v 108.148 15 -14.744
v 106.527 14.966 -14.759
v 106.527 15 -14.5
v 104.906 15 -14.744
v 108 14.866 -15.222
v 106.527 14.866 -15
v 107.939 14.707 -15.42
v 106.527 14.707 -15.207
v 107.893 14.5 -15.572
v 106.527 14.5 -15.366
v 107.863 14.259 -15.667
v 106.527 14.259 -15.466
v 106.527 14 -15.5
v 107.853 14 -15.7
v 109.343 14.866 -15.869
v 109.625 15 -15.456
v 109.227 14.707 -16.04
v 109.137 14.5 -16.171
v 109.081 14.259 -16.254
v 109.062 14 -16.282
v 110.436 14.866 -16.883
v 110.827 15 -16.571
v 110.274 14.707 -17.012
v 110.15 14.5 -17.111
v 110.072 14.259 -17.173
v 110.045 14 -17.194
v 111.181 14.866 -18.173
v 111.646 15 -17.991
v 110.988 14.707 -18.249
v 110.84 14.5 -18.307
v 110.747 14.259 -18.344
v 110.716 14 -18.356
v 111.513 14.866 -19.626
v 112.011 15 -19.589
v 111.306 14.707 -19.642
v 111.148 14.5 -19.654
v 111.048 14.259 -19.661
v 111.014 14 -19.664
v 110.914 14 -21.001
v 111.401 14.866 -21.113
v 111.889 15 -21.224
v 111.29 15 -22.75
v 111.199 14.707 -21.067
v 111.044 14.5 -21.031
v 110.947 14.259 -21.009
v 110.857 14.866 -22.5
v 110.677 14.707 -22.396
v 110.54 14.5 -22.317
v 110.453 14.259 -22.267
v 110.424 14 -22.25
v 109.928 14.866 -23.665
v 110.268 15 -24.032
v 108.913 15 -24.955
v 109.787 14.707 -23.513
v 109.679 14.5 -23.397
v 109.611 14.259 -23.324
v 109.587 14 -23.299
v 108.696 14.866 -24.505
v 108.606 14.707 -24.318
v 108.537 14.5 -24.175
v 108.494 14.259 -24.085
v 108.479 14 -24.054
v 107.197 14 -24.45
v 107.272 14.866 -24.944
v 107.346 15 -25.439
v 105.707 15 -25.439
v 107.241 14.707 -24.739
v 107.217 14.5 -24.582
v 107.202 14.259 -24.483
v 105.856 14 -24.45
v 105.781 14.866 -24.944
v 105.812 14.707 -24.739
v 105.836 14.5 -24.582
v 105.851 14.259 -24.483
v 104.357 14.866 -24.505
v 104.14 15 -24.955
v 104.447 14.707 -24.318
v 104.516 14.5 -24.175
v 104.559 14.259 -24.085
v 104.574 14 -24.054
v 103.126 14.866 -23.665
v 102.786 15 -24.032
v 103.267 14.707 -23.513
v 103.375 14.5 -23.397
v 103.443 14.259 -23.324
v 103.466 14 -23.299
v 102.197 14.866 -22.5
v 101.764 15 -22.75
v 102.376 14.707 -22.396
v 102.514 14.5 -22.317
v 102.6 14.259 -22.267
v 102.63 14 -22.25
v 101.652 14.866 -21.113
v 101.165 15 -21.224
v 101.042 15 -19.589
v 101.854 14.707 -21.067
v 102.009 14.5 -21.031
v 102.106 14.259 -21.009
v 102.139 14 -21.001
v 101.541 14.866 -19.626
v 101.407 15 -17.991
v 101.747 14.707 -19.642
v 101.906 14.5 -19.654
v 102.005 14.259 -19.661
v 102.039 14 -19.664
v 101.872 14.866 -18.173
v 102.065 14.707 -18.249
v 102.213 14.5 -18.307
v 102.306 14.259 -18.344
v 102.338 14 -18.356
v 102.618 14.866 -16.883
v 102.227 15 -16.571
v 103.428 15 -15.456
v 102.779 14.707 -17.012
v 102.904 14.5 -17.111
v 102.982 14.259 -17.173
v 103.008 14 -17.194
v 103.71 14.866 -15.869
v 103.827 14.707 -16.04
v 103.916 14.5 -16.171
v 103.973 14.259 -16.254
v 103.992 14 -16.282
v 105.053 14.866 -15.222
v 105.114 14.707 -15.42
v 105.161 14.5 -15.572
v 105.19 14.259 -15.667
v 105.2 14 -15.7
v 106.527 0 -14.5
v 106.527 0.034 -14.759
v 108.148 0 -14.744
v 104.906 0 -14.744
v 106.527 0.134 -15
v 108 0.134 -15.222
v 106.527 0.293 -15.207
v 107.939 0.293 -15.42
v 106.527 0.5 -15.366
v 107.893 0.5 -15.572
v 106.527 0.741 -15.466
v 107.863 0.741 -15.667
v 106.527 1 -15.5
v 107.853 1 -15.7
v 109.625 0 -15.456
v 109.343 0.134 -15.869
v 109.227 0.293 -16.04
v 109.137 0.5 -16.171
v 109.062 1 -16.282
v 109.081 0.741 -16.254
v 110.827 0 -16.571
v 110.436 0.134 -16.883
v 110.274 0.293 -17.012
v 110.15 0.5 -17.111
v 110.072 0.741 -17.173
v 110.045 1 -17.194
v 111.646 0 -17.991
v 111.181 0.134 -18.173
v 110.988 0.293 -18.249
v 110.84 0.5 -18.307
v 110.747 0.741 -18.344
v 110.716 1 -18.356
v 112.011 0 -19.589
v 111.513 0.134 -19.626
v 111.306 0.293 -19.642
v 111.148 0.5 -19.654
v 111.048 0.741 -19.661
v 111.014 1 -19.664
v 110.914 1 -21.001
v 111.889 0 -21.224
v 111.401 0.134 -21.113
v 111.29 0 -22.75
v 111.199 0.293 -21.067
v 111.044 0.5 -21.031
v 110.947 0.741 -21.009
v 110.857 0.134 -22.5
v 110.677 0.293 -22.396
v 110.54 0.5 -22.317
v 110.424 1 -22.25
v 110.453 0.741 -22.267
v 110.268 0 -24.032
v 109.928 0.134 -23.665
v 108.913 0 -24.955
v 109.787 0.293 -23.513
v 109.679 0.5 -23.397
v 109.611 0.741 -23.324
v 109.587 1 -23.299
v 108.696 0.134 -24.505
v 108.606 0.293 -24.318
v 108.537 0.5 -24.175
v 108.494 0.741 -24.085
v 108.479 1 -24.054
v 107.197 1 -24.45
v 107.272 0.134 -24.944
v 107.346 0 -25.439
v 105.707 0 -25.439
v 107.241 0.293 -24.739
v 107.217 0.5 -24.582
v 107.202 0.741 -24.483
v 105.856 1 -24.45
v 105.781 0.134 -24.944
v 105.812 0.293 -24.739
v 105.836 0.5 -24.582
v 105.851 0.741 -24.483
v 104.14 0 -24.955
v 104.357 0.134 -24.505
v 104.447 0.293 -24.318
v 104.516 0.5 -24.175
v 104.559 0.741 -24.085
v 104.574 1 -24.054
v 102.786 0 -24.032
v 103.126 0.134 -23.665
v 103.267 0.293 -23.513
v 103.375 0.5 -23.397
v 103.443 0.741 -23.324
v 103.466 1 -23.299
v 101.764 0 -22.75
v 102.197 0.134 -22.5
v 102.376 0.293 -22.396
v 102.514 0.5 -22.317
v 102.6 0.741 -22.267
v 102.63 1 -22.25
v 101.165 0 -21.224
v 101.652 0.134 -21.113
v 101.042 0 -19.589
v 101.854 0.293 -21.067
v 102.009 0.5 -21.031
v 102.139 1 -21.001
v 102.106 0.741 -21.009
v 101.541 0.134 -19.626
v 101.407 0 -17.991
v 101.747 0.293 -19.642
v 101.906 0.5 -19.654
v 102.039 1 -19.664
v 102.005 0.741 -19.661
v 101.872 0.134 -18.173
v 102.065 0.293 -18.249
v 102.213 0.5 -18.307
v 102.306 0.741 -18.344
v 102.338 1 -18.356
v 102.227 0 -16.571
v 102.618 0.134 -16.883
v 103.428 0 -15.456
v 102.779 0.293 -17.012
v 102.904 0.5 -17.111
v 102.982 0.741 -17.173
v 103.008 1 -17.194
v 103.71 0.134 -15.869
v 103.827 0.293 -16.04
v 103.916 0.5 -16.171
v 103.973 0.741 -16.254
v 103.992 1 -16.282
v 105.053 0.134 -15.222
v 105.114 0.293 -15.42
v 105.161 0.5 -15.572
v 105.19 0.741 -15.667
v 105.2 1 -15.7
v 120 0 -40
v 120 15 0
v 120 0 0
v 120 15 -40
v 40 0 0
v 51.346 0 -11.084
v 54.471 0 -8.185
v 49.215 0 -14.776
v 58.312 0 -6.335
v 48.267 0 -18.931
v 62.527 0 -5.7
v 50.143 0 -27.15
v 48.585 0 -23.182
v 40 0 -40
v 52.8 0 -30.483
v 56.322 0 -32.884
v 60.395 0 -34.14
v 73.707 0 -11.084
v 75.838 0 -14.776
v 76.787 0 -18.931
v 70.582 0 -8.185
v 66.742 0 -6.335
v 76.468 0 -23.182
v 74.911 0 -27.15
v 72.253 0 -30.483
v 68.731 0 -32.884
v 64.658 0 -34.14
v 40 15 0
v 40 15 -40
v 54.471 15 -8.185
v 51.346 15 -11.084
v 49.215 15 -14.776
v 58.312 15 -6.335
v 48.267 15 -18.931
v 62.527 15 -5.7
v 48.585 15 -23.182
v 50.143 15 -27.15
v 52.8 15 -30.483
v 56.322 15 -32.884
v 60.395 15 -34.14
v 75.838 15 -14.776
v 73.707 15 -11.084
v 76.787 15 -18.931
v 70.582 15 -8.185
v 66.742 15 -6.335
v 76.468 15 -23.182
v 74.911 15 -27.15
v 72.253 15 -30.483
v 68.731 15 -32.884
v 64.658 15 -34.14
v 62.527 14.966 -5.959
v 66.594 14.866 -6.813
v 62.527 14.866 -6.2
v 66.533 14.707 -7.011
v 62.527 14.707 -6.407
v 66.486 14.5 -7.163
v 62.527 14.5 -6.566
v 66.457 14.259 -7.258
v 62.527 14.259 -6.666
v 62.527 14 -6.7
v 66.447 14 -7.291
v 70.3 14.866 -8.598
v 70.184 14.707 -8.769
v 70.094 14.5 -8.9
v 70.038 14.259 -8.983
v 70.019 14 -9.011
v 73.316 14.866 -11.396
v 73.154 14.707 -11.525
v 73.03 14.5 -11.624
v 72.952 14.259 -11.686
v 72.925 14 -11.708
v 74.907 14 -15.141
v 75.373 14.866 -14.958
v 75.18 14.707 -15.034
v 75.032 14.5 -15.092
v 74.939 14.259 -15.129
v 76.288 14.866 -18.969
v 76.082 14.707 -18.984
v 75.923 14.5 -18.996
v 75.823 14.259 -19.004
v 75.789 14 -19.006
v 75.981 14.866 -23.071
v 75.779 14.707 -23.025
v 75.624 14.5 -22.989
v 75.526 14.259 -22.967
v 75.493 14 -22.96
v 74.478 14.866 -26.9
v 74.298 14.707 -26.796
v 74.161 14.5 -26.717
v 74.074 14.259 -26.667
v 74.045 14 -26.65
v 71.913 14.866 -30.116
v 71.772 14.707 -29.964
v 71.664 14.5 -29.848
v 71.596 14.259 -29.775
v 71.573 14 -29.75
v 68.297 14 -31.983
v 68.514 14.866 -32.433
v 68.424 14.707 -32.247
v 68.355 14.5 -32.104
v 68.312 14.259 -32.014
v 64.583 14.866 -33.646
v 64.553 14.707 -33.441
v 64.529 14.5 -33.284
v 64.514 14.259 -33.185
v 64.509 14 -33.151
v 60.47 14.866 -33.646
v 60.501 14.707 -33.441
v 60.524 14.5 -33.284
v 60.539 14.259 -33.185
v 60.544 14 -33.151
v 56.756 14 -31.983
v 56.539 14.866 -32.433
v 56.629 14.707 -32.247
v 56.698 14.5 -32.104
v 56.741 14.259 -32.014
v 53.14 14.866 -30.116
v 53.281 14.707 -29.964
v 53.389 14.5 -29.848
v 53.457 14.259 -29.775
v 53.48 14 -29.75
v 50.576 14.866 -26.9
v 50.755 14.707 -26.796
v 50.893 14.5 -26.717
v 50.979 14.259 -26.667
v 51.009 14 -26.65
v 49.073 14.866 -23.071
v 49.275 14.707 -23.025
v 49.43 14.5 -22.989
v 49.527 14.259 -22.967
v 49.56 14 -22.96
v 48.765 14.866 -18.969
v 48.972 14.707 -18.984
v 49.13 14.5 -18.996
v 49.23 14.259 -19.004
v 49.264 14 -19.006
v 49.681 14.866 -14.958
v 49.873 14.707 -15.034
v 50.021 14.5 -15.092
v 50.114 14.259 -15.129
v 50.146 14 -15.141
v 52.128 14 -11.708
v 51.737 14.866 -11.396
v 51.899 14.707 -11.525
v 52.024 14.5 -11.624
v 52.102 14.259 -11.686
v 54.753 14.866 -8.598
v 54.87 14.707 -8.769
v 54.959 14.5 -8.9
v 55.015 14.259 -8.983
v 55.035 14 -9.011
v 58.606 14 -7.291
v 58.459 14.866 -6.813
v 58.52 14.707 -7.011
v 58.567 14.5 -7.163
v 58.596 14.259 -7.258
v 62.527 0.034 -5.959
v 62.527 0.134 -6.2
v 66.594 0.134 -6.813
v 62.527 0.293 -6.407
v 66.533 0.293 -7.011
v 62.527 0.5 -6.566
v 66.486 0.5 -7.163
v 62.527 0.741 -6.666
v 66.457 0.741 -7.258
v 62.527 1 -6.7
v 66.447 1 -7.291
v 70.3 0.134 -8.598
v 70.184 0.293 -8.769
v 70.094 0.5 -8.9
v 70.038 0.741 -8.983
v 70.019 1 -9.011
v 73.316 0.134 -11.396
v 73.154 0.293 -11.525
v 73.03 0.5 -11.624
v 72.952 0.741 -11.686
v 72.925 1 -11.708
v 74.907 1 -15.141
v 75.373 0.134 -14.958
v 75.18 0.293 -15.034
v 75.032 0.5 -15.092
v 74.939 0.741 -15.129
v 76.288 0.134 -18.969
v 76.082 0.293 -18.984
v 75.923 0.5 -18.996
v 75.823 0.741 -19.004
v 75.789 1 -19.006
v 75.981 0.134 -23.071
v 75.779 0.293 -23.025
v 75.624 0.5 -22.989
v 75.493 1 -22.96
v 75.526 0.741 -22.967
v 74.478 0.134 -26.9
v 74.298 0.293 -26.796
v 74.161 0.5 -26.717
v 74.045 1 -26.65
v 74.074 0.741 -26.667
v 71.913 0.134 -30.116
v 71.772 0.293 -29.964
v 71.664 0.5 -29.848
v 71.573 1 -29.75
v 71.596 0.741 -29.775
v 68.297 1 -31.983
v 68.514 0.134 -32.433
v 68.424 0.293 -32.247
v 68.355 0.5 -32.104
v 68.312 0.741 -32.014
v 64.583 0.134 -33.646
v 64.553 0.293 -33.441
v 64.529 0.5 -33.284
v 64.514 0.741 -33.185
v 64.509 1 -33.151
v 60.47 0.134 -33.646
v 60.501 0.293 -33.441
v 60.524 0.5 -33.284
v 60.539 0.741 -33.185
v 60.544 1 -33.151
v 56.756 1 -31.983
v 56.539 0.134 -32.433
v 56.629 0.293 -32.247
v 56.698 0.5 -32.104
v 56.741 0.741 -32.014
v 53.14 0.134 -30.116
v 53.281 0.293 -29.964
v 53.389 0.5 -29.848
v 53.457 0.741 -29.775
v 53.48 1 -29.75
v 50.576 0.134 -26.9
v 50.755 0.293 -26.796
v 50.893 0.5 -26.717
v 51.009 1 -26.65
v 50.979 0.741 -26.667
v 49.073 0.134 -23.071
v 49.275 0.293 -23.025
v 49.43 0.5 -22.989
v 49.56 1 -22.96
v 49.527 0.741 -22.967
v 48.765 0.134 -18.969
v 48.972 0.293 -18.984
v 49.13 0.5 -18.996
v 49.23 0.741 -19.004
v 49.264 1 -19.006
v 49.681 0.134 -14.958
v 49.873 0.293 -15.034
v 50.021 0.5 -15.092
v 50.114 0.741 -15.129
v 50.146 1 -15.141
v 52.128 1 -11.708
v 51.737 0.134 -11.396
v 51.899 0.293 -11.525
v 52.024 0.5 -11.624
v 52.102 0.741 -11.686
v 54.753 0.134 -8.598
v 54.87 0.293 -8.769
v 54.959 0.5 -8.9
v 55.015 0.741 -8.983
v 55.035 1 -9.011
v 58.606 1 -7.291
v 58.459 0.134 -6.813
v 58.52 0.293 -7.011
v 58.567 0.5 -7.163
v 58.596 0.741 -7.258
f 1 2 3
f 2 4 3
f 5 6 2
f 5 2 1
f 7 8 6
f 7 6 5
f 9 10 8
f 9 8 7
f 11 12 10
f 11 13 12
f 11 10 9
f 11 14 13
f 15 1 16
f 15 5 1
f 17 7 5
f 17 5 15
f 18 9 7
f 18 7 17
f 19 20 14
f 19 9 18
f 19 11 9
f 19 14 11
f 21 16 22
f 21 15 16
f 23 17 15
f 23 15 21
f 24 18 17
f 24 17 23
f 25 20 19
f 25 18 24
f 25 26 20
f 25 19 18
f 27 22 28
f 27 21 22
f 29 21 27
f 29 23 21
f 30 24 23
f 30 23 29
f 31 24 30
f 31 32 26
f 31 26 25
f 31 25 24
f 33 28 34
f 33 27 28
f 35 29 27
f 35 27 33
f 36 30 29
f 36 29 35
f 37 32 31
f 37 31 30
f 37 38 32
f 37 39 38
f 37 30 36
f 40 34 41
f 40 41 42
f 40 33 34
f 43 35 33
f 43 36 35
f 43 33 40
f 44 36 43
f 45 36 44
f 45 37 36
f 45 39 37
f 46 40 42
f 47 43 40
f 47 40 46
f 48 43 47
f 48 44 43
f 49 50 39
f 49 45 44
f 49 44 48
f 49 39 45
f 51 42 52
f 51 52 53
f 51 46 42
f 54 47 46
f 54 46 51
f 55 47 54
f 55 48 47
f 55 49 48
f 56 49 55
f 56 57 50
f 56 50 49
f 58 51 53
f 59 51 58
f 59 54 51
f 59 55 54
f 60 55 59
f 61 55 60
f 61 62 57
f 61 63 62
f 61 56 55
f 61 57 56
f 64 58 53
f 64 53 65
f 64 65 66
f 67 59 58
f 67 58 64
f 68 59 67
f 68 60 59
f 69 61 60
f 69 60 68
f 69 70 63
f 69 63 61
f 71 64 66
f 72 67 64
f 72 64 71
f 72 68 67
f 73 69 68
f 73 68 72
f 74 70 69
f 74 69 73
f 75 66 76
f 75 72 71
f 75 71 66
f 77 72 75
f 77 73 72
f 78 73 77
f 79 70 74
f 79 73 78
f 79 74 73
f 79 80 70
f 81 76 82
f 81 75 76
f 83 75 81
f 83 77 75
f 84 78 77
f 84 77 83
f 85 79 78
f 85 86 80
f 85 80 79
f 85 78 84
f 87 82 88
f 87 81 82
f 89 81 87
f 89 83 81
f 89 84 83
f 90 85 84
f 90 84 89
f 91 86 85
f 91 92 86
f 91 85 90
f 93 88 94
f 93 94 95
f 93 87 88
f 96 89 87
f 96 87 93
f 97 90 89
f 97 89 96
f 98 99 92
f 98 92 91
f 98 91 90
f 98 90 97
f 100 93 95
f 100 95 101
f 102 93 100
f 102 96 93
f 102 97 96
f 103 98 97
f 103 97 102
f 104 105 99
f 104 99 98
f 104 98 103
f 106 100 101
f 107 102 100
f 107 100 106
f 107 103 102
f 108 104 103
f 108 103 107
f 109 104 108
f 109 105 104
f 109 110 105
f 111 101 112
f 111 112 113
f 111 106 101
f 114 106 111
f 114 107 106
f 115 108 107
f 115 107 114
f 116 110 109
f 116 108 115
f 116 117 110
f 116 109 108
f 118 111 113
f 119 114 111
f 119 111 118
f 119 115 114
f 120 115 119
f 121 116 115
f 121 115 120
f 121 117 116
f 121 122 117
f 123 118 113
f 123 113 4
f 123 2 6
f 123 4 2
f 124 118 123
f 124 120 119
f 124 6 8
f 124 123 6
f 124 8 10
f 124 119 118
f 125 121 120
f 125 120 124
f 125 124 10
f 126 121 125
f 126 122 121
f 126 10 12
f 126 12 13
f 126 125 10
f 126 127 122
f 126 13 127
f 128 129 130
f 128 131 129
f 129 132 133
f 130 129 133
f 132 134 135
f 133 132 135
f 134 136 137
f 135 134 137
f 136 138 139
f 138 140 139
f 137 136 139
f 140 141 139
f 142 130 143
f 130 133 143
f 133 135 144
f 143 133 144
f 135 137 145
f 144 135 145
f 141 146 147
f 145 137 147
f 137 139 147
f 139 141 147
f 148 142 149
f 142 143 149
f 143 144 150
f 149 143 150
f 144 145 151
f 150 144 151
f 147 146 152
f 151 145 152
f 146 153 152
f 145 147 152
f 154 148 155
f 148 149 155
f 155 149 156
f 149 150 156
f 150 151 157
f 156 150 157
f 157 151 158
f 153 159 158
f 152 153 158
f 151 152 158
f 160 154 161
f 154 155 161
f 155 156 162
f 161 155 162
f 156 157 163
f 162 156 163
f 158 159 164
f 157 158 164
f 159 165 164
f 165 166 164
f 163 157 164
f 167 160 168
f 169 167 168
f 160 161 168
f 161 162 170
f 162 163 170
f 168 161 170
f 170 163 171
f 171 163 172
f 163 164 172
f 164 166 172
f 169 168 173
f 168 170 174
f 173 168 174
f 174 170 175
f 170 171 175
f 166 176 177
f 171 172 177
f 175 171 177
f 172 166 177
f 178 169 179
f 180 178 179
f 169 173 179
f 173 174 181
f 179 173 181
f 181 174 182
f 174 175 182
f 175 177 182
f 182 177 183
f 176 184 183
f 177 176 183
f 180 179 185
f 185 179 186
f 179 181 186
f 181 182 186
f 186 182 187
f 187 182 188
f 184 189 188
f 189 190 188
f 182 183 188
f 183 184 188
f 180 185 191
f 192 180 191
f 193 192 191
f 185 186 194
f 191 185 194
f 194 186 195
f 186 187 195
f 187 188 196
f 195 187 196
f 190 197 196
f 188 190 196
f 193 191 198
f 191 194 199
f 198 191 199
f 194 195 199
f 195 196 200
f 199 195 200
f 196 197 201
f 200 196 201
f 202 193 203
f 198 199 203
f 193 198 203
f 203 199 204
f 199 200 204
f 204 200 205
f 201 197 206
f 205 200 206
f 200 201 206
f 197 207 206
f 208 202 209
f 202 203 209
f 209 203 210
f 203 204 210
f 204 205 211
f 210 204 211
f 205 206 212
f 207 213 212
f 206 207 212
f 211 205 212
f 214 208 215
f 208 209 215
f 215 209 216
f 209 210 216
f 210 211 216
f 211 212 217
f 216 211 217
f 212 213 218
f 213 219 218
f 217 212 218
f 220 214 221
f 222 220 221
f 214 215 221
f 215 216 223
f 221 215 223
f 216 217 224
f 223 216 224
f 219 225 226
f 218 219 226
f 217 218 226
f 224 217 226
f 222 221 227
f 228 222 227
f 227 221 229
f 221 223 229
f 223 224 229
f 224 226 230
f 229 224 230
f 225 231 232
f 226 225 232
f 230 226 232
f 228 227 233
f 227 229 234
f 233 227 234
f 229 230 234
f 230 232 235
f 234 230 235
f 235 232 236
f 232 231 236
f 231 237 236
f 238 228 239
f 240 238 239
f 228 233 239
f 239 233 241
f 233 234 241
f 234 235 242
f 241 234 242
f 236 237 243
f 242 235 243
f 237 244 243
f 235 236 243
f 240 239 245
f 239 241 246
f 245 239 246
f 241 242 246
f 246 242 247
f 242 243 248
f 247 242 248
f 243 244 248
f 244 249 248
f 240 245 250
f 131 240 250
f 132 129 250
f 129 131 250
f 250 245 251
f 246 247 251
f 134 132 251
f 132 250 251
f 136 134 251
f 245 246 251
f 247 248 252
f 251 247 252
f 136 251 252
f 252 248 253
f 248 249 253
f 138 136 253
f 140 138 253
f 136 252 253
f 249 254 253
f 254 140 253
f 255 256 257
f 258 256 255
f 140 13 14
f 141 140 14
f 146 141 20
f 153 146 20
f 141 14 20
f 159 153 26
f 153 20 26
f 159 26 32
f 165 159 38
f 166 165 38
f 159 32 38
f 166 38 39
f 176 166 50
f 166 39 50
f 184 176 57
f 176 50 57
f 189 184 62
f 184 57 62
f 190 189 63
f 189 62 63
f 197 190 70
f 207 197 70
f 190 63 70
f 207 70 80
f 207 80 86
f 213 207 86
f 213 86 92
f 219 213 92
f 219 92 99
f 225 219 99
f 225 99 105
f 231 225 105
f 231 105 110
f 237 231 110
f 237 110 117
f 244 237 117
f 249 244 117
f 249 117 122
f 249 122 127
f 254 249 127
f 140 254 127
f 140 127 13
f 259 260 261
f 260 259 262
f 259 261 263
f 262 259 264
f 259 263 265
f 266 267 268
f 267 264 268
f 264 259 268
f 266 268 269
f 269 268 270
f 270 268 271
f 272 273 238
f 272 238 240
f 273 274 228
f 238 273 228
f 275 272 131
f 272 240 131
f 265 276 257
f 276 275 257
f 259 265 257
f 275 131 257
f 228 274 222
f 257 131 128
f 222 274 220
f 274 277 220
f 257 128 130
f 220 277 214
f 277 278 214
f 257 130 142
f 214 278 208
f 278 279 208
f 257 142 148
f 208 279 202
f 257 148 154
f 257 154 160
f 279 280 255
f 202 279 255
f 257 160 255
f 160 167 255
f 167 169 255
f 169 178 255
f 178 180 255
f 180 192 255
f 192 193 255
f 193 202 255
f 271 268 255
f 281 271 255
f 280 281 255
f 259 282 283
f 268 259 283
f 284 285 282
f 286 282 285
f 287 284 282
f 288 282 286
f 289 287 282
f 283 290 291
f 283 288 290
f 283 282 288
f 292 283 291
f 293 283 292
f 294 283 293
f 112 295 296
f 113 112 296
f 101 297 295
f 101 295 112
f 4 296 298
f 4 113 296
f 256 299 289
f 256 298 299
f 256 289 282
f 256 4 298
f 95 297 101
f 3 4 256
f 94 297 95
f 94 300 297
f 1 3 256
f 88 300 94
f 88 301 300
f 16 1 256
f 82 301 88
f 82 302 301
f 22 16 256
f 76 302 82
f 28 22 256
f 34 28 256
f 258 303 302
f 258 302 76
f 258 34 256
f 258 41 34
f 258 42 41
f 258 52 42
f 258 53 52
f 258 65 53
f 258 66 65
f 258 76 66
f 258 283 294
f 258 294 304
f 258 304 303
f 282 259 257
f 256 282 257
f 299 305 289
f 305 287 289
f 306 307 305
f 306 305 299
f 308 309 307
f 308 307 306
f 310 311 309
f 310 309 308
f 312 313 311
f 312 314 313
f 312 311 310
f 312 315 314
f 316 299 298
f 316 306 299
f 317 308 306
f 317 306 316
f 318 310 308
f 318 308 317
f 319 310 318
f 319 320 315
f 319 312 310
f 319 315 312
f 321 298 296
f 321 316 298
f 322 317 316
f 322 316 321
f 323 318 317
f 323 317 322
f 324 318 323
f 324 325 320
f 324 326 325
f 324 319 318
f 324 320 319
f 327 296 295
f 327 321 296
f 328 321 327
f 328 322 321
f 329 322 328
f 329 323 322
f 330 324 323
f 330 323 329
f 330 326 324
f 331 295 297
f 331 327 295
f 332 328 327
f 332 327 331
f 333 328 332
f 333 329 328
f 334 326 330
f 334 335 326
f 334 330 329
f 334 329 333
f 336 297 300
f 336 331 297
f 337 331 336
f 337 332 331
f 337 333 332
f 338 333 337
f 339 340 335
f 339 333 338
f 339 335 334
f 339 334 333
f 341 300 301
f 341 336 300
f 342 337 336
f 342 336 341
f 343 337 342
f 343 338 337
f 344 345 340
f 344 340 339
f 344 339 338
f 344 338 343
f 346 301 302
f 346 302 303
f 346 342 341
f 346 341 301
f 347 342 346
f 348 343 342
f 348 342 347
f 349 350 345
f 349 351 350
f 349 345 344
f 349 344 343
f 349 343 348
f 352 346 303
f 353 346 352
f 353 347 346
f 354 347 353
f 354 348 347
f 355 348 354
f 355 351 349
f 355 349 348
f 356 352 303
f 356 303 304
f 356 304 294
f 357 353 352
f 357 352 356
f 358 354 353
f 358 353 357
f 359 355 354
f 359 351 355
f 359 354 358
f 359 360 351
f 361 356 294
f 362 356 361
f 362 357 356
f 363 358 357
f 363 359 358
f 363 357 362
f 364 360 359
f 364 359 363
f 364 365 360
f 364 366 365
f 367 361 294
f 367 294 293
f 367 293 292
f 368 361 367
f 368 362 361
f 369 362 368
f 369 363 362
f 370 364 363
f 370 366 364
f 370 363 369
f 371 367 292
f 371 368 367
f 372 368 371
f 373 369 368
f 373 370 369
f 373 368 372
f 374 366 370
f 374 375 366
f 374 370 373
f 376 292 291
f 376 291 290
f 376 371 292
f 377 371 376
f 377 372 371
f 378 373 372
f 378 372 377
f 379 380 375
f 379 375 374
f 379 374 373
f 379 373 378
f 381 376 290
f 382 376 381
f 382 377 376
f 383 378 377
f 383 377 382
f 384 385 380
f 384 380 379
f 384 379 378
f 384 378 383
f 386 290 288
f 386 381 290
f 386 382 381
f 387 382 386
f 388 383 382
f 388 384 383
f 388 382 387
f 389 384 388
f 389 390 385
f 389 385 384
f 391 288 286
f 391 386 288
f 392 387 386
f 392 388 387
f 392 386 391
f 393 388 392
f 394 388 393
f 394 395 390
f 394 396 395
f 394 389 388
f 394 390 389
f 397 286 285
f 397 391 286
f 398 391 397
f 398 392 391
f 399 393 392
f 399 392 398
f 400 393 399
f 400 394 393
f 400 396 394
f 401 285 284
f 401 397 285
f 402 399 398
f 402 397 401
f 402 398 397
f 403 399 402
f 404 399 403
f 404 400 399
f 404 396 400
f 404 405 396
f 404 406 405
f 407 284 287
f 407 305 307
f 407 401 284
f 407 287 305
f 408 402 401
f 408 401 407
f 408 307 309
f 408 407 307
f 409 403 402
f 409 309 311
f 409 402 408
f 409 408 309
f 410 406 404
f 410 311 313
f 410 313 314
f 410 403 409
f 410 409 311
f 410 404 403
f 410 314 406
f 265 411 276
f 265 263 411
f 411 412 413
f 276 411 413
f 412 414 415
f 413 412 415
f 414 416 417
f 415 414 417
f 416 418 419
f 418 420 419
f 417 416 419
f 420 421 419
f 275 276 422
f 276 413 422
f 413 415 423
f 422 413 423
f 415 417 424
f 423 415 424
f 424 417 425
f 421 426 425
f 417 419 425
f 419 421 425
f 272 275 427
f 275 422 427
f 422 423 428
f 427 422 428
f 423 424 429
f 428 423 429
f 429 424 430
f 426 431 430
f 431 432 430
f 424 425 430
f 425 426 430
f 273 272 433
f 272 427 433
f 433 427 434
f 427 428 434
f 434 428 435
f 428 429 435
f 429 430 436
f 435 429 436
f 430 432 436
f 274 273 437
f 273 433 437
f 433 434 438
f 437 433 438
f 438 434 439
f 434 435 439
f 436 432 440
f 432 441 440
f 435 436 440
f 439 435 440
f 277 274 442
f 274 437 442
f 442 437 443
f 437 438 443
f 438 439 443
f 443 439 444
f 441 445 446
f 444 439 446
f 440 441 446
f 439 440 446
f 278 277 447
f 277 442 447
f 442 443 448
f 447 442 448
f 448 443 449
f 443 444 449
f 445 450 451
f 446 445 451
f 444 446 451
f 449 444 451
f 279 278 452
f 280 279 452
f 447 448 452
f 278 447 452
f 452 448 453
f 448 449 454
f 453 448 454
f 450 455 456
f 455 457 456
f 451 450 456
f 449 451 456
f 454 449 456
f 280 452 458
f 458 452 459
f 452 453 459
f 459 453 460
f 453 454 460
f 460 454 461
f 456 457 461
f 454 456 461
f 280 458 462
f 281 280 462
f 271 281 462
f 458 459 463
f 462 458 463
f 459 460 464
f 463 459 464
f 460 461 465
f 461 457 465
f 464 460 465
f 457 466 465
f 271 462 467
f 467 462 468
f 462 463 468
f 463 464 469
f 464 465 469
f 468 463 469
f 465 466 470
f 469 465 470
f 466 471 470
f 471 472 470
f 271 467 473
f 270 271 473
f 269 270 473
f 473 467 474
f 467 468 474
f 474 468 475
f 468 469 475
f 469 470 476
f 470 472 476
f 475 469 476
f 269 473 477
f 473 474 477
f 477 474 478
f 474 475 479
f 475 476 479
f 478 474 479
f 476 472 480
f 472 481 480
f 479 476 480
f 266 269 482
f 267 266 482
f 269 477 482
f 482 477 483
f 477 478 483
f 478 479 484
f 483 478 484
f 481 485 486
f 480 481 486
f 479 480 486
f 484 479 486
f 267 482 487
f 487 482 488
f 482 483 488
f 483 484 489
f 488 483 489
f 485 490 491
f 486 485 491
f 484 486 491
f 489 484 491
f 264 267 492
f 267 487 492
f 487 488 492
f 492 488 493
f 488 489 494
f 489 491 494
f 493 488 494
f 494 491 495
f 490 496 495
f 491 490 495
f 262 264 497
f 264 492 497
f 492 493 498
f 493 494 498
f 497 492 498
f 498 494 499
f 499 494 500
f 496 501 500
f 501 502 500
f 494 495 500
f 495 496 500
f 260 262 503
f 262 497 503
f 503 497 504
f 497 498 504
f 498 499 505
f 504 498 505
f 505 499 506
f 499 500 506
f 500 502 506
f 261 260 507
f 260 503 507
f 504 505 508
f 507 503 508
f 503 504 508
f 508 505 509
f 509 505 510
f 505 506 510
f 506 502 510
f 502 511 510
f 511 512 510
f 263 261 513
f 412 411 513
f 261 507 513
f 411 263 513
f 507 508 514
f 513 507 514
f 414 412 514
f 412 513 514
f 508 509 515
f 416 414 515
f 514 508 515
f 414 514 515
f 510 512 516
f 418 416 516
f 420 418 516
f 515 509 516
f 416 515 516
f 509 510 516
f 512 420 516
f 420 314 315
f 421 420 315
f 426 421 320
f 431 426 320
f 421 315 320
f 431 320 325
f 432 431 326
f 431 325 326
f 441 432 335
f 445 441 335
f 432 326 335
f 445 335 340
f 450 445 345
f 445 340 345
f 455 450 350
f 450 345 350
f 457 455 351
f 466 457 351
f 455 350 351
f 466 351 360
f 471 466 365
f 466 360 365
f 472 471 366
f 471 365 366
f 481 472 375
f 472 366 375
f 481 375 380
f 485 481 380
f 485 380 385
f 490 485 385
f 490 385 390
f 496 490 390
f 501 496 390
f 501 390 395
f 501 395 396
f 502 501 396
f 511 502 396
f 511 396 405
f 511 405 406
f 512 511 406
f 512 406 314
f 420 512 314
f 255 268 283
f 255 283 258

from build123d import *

# Parameters (mm, degrees)
SKETCH_1_W          = 125
SKETCH_1_H          = 40
EXTRUDE_1_DEPTH     = 15
SKETCH_2_R          = 8.9
SKETCH_2_R_2        = 4.5
SKETCH_2_R_3        = 13.3
CUT_EXTRUDE_1_DEPTH = 133.098448136
CHAMFER_1_SIZE      = 1
CHAMFER_2_SIZE      = 1
FILLET_1_R          = 1
SKETCH_3_W          = 40
SKETCH_3_H          = 61.182970239
CUT_EXTRUDE_2_DEPTH = 133.098448148
SKETCH_5_W          = 5
SKETCH_5_H          = 48.384785396
CUT_EXTRUDE_3_DEPTH = 133.098448148


with BuildPart() as part:
    # 草圖1 → 填料-伸長1 (new body)
    with BuildSketch(Plane(origin=(0, 0, 0), x_dir=(1, 0, 0), z_dir=(0, 1, 0))):
        with Locations((62.5, 20)):
            Rectangle(SKETCH_1_W, SKETCH_1_H)
    extrude(amount=EXTRUDE_1_DEPTH)

    # 草圖2 → 除料-伸長1 (cut, through all)
    with BuildSketch(Plane(origin=(0, 15, 0), x_dir=(1, 0, 0), z_dir=(0, 1, 0))):
        with Locations(Location((18.526668527, 20, 0), (0, 0, 270))):
            Circle(SKETCH_2_R)
        with Locations(Location((106.526668527, 20, 0), (0, 0, 270))):
            Circle(SKETCH_2_R_2)
        with Locations(Location((62.526668527, 20, 0), (0, 0, 270))):
            Circle(SKETCH_2_R_3)
    extrude(amount=-CUT_EXTRUDE_1_DEPTH, mode=Mode.SUBTRACT)

    # 導角1
    chamfer_1_edges = [part.edges().sort_by_distance(p)[0] for p in [
        (18.526668527, 15, -28.9),
    ]]
    chamfer(chamfer_1_edges, length=CHAMFER_1_SIZE)

    # 導角2
    chamfer_2_edges = [part.edges().sort_by_distance(p)[0] for p in [
        (18.526668527, 0, -28.9),
    ]]
    chamfer(chamfer_2_edges, length=CHAMFER_2_SIZE)

    # 圓角1
    fillet_1_edges = [part.edges().sort_by_distance(p)[0] for p in [
        (106.526668527, 0, -24.5),
        (106.526668527, 15, -24.5),
        (62.526668527, 0, -33.3),
        (62.526668527, 15, -33.3),
    ]]
    fillet(fillet_1_edges, radius=FILLET_1_R)

    # 草圖3 → 除料-伸長2 (cut, through all)
    with BuildSketch(Plane(origin=(0, 15, 0), x_dir=(1, 0, 0), z_dir=(0, 1, 0))):
        with Locations((20, 30.59148512)):
            Rectangle(SKETCH_3_W, SKETCH_3_H)
    extrude(amount=-CUT_EXTRUDE_2_DEPTH, mode=Mode.SUBTRACT)

    # 草圖5 → 除料-伸長3 (cut, through all)
    with BuildSketch(Plane(origin=(0, 15, 0), x_dir=(1, 0, 0), z_dir=(0, 1, 0))):
        with Locations((122.5, 24.192392698)):
            Rectangle(SKETCH_5_W, SKETCH_5_H)
    extrude(amount=-CUT_EXTRUDE_3_DEPTH, mode=Mode.SUBTRACT)


solid = part.part
